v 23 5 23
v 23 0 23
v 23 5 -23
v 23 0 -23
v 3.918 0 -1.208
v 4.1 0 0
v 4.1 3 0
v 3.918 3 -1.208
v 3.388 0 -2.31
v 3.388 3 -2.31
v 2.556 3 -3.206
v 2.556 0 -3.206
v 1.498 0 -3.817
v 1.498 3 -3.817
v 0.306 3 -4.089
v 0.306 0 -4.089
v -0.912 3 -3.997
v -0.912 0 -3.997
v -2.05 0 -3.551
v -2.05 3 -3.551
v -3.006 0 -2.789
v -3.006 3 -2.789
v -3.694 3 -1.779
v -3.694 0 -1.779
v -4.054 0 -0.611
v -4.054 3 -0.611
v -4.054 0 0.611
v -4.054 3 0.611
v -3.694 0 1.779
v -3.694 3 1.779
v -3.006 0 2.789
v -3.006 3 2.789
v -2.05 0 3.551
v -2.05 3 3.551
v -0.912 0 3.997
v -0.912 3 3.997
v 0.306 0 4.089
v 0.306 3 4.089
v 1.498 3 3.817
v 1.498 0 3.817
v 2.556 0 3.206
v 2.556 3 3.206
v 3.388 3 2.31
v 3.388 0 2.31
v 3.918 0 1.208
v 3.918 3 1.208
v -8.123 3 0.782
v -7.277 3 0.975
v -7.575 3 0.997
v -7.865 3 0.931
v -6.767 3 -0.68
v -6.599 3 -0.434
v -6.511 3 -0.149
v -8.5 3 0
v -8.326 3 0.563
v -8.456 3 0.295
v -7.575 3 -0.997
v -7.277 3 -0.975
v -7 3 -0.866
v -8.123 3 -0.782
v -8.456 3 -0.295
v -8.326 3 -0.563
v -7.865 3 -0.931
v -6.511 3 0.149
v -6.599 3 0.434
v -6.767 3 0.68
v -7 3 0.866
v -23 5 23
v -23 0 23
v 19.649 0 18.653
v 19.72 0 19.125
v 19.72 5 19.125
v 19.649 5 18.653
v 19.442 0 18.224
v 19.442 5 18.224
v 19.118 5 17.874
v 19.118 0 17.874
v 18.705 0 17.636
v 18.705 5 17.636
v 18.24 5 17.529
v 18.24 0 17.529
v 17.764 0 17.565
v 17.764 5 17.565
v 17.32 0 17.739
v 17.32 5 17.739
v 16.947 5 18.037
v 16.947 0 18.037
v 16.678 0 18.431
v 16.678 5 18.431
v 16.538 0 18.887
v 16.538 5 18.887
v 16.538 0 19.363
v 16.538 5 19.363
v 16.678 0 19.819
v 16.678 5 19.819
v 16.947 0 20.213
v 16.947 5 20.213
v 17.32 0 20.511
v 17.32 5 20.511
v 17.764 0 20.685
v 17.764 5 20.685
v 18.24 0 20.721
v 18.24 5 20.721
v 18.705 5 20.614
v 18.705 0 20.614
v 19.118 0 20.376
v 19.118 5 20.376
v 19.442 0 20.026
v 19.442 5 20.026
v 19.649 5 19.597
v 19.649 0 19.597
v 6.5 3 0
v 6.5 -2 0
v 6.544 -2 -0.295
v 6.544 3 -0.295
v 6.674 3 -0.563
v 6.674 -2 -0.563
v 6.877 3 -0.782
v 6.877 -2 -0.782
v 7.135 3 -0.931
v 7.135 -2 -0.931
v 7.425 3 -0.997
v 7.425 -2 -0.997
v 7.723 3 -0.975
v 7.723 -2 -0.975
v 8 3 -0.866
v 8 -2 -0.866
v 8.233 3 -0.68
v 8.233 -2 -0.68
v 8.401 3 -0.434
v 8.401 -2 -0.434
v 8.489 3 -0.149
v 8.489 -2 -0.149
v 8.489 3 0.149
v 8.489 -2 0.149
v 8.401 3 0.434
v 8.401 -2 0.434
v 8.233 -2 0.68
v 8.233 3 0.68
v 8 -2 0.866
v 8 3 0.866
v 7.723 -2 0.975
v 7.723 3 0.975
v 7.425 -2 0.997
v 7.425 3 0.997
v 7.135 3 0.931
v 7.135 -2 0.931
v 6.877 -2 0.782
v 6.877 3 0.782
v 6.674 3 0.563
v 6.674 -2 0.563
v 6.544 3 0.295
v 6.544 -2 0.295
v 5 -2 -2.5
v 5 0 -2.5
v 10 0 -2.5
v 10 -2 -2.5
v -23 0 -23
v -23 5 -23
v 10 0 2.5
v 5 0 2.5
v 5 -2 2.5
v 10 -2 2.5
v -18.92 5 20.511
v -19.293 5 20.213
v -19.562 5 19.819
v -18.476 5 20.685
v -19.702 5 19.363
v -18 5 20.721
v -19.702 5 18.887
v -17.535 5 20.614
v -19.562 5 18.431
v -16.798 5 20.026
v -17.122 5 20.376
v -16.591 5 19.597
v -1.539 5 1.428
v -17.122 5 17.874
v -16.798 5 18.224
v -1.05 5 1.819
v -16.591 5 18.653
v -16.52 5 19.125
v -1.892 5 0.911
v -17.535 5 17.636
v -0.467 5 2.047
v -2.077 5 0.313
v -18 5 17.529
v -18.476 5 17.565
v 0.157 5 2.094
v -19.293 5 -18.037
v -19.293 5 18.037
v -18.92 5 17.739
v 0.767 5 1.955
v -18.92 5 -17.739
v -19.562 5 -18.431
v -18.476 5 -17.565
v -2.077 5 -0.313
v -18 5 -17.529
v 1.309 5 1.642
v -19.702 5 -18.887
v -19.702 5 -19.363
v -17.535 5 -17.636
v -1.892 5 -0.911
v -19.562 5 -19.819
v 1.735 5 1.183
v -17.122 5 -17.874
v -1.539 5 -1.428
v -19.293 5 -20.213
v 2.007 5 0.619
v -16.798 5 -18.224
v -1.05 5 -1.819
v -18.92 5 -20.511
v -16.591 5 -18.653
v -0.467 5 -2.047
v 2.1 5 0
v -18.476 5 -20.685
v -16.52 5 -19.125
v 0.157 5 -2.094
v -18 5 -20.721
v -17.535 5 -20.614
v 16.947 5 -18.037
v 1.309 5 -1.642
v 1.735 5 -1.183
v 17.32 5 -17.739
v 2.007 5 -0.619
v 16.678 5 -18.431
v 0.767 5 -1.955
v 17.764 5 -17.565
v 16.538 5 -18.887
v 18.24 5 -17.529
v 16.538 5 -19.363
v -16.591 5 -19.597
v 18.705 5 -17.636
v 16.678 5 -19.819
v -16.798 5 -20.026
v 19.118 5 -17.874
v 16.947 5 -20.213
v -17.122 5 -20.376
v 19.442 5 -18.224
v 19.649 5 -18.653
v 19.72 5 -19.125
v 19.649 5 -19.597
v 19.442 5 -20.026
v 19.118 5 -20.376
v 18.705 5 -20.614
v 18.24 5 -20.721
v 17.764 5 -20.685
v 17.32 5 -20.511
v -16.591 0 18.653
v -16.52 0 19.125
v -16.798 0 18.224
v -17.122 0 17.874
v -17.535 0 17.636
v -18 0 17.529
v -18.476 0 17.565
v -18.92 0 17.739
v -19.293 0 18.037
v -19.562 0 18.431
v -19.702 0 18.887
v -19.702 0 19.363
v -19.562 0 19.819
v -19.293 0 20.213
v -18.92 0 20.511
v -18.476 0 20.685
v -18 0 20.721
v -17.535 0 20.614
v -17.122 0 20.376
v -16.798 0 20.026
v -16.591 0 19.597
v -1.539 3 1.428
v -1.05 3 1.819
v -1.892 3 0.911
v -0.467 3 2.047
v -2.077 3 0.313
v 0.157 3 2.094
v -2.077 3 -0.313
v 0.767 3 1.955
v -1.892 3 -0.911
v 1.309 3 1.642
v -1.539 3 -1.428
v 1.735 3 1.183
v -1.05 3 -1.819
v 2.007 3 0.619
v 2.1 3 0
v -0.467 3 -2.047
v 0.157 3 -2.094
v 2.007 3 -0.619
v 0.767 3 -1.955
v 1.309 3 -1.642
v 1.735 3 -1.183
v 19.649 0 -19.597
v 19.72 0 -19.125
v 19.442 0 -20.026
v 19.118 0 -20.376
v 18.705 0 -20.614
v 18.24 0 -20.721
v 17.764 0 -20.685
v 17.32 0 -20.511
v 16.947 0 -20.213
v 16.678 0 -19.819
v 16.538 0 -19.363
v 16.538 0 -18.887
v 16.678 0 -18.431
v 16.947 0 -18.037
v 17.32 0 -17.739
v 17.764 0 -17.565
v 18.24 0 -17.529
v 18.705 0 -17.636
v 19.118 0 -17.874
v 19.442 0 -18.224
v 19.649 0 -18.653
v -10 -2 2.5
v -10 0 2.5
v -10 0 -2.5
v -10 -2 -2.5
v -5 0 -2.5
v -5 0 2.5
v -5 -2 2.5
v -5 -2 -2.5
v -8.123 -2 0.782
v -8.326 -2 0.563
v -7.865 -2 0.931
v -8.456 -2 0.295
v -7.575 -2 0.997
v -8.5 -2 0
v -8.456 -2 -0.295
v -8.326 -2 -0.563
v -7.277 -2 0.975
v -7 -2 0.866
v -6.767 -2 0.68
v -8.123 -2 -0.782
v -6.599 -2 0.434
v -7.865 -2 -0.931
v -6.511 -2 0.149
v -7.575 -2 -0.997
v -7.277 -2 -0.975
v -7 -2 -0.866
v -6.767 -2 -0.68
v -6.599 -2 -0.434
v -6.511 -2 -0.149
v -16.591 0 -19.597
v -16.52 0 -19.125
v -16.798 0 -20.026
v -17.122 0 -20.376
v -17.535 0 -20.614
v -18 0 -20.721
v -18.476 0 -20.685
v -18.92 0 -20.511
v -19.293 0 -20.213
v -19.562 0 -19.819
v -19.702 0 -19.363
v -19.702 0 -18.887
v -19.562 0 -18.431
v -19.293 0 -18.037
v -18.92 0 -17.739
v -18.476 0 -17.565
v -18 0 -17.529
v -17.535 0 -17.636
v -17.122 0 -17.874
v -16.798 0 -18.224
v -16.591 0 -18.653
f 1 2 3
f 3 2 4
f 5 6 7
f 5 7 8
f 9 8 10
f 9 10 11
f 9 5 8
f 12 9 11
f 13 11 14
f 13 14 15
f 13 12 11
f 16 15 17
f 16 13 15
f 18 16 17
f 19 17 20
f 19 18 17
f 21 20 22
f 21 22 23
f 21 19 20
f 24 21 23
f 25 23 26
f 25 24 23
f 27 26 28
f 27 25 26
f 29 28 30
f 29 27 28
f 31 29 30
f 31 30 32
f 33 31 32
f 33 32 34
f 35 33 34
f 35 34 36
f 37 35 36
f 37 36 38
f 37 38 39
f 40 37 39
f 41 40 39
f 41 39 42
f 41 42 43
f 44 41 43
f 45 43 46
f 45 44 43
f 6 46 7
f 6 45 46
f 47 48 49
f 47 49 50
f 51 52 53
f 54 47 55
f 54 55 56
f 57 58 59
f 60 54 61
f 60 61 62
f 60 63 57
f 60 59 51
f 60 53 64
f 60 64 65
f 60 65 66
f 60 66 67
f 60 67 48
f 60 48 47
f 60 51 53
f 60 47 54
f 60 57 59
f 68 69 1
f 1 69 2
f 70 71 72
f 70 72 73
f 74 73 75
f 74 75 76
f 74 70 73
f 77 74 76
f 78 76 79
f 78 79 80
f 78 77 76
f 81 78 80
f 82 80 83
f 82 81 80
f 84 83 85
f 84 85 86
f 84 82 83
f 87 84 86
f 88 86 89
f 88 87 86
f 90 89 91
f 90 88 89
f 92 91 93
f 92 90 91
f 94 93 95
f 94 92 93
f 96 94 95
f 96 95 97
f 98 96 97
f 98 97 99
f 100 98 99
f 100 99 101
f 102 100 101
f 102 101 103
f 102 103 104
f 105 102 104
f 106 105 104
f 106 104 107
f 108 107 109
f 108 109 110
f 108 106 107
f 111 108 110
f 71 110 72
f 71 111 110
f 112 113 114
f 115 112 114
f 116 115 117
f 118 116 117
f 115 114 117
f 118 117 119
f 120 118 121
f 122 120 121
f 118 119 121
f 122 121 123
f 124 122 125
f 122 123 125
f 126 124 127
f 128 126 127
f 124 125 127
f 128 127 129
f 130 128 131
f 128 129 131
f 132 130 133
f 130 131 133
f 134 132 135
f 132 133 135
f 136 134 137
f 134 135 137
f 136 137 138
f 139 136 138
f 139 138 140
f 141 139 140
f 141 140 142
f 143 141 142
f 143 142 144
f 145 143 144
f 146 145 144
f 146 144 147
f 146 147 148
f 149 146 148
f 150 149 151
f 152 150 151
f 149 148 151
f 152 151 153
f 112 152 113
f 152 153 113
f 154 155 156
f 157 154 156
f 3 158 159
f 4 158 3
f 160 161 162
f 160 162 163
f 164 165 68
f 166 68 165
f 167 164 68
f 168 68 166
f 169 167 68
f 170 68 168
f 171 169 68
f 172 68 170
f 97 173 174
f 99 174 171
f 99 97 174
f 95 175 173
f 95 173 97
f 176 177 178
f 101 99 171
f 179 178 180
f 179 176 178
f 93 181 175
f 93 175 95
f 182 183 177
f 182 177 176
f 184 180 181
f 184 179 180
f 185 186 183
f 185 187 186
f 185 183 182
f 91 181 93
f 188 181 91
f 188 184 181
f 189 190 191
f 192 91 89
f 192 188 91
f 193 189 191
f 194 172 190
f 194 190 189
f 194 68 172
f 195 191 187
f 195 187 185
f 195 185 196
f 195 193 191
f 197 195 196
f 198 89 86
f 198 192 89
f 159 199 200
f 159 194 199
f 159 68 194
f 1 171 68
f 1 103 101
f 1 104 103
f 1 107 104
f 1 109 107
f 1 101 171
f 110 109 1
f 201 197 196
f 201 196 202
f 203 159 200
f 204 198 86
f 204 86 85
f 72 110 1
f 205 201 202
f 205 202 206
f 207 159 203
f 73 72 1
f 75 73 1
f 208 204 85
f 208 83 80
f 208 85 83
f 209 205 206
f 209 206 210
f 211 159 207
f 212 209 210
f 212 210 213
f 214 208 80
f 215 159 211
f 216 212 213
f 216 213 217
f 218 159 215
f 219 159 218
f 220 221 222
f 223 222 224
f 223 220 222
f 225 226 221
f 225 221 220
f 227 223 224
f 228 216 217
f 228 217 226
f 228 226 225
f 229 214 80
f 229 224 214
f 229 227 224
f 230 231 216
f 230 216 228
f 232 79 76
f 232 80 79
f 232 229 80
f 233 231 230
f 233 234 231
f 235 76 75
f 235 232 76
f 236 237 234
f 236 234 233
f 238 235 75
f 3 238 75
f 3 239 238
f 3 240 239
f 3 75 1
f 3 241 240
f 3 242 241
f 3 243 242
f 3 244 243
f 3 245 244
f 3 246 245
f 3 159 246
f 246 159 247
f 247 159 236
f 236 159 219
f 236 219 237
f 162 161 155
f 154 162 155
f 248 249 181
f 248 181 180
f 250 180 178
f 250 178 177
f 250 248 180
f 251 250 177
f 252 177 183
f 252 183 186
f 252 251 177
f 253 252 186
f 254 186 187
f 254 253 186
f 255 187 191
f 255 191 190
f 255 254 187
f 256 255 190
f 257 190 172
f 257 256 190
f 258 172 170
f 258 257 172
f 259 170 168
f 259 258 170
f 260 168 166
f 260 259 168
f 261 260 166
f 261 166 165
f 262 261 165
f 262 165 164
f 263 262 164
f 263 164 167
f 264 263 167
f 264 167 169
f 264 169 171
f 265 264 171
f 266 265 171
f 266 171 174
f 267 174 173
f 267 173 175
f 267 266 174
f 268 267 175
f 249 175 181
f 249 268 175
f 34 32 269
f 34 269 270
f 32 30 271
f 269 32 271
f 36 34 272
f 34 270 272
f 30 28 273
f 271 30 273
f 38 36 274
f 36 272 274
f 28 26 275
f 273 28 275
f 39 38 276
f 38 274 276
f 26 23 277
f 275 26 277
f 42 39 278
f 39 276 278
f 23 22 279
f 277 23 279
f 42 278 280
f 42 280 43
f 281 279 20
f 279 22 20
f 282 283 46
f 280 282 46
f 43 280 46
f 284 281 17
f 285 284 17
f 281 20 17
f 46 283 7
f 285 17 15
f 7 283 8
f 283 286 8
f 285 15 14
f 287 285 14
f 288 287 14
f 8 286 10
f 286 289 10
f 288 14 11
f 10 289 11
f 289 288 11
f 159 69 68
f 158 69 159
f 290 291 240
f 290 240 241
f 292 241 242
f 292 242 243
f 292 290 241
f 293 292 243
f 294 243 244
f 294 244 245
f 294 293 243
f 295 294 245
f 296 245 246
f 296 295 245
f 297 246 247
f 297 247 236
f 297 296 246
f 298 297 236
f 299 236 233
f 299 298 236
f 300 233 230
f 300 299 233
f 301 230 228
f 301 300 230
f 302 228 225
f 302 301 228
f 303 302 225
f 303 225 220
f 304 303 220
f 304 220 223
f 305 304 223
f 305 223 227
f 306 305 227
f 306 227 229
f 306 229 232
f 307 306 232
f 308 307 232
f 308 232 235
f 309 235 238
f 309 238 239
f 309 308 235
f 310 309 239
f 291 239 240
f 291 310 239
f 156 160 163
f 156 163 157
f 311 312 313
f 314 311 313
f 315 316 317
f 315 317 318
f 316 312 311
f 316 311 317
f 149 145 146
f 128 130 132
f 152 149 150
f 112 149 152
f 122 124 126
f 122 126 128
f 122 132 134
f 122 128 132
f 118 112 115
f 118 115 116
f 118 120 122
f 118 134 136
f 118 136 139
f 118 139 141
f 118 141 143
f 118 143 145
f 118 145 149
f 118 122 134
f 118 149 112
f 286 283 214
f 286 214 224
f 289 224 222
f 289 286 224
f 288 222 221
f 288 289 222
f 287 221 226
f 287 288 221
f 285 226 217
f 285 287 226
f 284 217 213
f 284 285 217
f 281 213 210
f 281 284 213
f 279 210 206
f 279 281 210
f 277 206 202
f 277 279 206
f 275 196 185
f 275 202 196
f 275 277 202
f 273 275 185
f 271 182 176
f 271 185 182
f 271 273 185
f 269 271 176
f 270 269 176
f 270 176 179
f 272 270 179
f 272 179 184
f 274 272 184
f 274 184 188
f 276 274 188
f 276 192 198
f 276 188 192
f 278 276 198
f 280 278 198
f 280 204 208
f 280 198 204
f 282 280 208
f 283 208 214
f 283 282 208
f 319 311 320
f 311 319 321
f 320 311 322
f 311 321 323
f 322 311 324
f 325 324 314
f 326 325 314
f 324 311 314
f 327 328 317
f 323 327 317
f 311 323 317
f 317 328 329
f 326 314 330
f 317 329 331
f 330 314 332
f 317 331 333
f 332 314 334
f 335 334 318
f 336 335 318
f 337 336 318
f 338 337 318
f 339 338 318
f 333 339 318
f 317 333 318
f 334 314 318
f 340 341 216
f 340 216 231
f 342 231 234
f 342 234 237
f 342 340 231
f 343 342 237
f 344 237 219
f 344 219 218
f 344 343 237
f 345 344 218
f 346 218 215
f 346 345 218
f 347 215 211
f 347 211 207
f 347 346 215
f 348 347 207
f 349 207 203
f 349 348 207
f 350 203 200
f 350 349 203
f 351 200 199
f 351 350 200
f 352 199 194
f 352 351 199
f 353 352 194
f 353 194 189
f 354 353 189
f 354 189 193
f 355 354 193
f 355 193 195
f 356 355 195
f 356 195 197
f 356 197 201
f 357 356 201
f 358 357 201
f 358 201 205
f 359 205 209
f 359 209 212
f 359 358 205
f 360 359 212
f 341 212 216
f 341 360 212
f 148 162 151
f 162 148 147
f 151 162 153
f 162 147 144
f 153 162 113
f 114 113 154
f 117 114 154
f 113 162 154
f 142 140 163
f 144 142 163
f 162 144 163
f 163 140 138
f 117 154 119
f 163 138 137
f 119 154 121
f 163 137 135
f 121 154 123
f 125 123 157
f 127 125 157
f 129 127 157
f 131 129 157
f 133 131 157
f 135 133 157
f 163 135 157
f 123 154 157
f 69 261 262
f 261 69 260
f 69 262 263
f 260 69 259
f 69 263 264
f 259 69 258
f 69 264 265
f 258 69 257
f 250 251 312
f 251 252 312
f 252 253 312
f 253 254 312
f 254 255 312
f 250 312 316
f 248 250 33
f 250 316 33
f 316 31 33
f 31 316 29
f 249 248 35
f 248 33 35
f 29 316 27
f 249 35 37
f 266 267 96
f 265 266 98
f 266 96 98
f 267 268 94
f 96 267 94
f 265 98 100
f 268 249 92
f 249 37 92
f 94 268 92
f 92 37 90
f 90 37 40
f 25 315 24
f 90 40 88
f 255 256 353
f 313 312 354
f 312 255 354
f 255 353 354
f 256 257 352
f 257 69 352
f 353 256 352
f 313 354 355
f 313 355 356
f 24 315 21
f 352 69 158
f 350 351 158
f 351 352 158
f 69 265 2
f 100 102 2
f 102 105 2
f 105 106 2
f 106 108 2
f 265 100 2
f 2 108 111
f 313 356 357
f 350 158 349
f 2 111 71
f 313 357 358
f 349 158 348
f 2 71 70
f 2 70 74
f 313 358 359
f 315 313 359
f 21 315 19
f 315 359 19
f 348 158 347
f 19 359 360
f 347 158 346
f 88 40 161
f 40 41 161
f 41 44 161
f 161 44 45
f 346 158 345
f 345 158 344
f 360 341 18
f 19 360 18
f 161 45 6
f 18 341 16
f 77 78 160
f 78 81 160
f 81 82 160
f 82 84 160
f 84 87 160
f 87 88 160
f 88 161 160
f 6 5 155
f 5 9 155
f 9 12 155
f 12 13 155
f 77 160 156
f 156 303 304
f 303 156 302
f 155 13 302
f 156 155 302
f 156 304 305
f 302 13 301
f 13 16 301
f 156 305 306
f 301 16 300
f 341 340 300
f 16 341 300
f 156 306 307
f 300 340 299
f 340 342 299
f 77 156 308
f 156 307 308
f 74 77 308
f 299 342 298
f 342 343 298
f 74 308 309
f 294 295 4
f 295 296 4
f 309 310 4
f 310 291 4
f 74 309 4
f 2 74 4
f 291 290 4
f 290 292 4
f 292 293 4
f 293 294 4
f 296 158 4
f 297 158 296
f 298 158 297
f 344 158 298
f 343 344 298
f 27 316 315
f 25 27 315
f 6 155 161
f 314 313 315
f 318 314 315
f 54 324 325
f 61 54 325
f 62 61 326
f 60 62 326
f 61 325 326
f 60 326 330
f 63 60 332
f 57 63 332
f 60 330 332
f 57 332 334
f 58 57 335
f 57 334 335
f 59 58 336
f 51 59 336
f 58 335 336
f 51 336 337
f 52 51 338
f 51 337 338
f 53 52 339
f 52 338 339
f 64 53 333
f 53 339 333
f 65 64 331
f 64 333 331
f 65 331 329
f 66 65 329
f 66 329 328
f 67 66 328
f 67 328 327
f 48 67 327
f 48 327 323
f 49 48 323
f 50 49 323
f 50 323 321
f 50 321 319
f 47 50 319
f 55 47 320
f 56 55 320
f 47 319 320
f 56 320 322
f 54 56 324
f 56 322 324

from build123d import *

# Parameters (mm, degrees)
SKETCH1_W           = 46
SKETCH1_H           = 46
BOSS_EXTRUDE1_DEPTH = 5
SKETCH3_R           = 4.1
CUT_EXTRUDE2_DEPTH  = 3
SKETCH4_R           = 2.1
CUT_EXTRUDE3_DEPTH  = 6
SKETCH5_W           = 5
SKETCH5_H           = 5
BOSS_EXTRUDE2_DEPTH = 2
SKETCH6_R           = 1
CUT_EXTRUDE4_DEPTH  = 5
SKETCH7_R           = 1.6
CUT_EXTRUDE5_DEPTH  = 5


with BuildPart() as part:
    # Sketch1 → Boss-Extrude1 (new body)
    with BuildSketch(Plane(origin=(0, 0, 0), x_dir=(1, 0, 0), z_dir=(0, 1, 0))):
        Rectangle(SKETCH1_W, SKETCH1_H)
    extrude(amount=BOSS_EXTRUDE1_DEPTH)

    # Sketch3 → Cut-Extrude2 (cut)
    with BuildSketch(Plane(origin=(0, 0, 0), x_dir=(1, 0, 0), z_dir=(0, 1, 0))):
        Circle(SKETCH3_R)
    extrude(amount=CUT_EXTRUDE2_DEPTH, mode=Mode.SUBTRACT)

    # Sketch4 → Cut-Extrude3 (cut, through all)
    with BuildSketch(Plane(origin=(0, 0, 0), x_dir=(1, 0, 0), z_dir=(0, 1, 0))):
        Circle(SKETCH4_R)
    extrude(amount=CUT_EXTRUDE3_DEPTH, mode=Mode.SUBTRACT)

    # Sketch5 → Boss-Extrude2 (add)
    with BuildSketch(Plane(origin=(0, 0, 0), x_dir=(1, 0, 0), z_dir=(0, 1, 0))):
        with Locations((7.5, 0)):
            Rectangle(SKETCH5_W, SKETCH5_H)
        with Locations((-7.5, 0)):
            Rectangle(SKETCH5_W, SKETCH5_H)
    extrude(amount=-BOSS_EXTRUDE2_DEPTH)

    # Sketch6 → Cut-Extrude4 (cut)
    with BuildSketch(Plane(origin=(0, -2, 0), x_dir=(-1, 0, 0), z_dir=(0, -1, 0))):
        with Locations((7.5, 0)):
            Circle(SKETCH6_R)
        with Locations((-7.5, 0)):
            Circle(SKETCH6_R)
    extrude(amount=-CUT_EXTRUDE4_DEPTH, mode=Mode.SUBTRACT)

    # Sketch7 → Cut-Extrude5 (cut)
    with BuildSketch(Plane(origin=(0, 0, 0), x_dir=(1, 0, 0), z_dir=(0, 1, 0))):
        with Locations((-18.12, -19.125)):
            Circle(SKETCH7_R)
        with Locations((18.12, -19.125)):
            Circle(SKETCH7_R)
        with Locations((18.12, 19.125)):
            Circle(SKETCH7_R)
        with Locations((-18.12, 19.125)):
            Circle(SKETCH7_R)
    extrude(amount=CUT_EXTRUDE5_DEPTH, mode=Mode.SUBTRACT)


solid = part.part
